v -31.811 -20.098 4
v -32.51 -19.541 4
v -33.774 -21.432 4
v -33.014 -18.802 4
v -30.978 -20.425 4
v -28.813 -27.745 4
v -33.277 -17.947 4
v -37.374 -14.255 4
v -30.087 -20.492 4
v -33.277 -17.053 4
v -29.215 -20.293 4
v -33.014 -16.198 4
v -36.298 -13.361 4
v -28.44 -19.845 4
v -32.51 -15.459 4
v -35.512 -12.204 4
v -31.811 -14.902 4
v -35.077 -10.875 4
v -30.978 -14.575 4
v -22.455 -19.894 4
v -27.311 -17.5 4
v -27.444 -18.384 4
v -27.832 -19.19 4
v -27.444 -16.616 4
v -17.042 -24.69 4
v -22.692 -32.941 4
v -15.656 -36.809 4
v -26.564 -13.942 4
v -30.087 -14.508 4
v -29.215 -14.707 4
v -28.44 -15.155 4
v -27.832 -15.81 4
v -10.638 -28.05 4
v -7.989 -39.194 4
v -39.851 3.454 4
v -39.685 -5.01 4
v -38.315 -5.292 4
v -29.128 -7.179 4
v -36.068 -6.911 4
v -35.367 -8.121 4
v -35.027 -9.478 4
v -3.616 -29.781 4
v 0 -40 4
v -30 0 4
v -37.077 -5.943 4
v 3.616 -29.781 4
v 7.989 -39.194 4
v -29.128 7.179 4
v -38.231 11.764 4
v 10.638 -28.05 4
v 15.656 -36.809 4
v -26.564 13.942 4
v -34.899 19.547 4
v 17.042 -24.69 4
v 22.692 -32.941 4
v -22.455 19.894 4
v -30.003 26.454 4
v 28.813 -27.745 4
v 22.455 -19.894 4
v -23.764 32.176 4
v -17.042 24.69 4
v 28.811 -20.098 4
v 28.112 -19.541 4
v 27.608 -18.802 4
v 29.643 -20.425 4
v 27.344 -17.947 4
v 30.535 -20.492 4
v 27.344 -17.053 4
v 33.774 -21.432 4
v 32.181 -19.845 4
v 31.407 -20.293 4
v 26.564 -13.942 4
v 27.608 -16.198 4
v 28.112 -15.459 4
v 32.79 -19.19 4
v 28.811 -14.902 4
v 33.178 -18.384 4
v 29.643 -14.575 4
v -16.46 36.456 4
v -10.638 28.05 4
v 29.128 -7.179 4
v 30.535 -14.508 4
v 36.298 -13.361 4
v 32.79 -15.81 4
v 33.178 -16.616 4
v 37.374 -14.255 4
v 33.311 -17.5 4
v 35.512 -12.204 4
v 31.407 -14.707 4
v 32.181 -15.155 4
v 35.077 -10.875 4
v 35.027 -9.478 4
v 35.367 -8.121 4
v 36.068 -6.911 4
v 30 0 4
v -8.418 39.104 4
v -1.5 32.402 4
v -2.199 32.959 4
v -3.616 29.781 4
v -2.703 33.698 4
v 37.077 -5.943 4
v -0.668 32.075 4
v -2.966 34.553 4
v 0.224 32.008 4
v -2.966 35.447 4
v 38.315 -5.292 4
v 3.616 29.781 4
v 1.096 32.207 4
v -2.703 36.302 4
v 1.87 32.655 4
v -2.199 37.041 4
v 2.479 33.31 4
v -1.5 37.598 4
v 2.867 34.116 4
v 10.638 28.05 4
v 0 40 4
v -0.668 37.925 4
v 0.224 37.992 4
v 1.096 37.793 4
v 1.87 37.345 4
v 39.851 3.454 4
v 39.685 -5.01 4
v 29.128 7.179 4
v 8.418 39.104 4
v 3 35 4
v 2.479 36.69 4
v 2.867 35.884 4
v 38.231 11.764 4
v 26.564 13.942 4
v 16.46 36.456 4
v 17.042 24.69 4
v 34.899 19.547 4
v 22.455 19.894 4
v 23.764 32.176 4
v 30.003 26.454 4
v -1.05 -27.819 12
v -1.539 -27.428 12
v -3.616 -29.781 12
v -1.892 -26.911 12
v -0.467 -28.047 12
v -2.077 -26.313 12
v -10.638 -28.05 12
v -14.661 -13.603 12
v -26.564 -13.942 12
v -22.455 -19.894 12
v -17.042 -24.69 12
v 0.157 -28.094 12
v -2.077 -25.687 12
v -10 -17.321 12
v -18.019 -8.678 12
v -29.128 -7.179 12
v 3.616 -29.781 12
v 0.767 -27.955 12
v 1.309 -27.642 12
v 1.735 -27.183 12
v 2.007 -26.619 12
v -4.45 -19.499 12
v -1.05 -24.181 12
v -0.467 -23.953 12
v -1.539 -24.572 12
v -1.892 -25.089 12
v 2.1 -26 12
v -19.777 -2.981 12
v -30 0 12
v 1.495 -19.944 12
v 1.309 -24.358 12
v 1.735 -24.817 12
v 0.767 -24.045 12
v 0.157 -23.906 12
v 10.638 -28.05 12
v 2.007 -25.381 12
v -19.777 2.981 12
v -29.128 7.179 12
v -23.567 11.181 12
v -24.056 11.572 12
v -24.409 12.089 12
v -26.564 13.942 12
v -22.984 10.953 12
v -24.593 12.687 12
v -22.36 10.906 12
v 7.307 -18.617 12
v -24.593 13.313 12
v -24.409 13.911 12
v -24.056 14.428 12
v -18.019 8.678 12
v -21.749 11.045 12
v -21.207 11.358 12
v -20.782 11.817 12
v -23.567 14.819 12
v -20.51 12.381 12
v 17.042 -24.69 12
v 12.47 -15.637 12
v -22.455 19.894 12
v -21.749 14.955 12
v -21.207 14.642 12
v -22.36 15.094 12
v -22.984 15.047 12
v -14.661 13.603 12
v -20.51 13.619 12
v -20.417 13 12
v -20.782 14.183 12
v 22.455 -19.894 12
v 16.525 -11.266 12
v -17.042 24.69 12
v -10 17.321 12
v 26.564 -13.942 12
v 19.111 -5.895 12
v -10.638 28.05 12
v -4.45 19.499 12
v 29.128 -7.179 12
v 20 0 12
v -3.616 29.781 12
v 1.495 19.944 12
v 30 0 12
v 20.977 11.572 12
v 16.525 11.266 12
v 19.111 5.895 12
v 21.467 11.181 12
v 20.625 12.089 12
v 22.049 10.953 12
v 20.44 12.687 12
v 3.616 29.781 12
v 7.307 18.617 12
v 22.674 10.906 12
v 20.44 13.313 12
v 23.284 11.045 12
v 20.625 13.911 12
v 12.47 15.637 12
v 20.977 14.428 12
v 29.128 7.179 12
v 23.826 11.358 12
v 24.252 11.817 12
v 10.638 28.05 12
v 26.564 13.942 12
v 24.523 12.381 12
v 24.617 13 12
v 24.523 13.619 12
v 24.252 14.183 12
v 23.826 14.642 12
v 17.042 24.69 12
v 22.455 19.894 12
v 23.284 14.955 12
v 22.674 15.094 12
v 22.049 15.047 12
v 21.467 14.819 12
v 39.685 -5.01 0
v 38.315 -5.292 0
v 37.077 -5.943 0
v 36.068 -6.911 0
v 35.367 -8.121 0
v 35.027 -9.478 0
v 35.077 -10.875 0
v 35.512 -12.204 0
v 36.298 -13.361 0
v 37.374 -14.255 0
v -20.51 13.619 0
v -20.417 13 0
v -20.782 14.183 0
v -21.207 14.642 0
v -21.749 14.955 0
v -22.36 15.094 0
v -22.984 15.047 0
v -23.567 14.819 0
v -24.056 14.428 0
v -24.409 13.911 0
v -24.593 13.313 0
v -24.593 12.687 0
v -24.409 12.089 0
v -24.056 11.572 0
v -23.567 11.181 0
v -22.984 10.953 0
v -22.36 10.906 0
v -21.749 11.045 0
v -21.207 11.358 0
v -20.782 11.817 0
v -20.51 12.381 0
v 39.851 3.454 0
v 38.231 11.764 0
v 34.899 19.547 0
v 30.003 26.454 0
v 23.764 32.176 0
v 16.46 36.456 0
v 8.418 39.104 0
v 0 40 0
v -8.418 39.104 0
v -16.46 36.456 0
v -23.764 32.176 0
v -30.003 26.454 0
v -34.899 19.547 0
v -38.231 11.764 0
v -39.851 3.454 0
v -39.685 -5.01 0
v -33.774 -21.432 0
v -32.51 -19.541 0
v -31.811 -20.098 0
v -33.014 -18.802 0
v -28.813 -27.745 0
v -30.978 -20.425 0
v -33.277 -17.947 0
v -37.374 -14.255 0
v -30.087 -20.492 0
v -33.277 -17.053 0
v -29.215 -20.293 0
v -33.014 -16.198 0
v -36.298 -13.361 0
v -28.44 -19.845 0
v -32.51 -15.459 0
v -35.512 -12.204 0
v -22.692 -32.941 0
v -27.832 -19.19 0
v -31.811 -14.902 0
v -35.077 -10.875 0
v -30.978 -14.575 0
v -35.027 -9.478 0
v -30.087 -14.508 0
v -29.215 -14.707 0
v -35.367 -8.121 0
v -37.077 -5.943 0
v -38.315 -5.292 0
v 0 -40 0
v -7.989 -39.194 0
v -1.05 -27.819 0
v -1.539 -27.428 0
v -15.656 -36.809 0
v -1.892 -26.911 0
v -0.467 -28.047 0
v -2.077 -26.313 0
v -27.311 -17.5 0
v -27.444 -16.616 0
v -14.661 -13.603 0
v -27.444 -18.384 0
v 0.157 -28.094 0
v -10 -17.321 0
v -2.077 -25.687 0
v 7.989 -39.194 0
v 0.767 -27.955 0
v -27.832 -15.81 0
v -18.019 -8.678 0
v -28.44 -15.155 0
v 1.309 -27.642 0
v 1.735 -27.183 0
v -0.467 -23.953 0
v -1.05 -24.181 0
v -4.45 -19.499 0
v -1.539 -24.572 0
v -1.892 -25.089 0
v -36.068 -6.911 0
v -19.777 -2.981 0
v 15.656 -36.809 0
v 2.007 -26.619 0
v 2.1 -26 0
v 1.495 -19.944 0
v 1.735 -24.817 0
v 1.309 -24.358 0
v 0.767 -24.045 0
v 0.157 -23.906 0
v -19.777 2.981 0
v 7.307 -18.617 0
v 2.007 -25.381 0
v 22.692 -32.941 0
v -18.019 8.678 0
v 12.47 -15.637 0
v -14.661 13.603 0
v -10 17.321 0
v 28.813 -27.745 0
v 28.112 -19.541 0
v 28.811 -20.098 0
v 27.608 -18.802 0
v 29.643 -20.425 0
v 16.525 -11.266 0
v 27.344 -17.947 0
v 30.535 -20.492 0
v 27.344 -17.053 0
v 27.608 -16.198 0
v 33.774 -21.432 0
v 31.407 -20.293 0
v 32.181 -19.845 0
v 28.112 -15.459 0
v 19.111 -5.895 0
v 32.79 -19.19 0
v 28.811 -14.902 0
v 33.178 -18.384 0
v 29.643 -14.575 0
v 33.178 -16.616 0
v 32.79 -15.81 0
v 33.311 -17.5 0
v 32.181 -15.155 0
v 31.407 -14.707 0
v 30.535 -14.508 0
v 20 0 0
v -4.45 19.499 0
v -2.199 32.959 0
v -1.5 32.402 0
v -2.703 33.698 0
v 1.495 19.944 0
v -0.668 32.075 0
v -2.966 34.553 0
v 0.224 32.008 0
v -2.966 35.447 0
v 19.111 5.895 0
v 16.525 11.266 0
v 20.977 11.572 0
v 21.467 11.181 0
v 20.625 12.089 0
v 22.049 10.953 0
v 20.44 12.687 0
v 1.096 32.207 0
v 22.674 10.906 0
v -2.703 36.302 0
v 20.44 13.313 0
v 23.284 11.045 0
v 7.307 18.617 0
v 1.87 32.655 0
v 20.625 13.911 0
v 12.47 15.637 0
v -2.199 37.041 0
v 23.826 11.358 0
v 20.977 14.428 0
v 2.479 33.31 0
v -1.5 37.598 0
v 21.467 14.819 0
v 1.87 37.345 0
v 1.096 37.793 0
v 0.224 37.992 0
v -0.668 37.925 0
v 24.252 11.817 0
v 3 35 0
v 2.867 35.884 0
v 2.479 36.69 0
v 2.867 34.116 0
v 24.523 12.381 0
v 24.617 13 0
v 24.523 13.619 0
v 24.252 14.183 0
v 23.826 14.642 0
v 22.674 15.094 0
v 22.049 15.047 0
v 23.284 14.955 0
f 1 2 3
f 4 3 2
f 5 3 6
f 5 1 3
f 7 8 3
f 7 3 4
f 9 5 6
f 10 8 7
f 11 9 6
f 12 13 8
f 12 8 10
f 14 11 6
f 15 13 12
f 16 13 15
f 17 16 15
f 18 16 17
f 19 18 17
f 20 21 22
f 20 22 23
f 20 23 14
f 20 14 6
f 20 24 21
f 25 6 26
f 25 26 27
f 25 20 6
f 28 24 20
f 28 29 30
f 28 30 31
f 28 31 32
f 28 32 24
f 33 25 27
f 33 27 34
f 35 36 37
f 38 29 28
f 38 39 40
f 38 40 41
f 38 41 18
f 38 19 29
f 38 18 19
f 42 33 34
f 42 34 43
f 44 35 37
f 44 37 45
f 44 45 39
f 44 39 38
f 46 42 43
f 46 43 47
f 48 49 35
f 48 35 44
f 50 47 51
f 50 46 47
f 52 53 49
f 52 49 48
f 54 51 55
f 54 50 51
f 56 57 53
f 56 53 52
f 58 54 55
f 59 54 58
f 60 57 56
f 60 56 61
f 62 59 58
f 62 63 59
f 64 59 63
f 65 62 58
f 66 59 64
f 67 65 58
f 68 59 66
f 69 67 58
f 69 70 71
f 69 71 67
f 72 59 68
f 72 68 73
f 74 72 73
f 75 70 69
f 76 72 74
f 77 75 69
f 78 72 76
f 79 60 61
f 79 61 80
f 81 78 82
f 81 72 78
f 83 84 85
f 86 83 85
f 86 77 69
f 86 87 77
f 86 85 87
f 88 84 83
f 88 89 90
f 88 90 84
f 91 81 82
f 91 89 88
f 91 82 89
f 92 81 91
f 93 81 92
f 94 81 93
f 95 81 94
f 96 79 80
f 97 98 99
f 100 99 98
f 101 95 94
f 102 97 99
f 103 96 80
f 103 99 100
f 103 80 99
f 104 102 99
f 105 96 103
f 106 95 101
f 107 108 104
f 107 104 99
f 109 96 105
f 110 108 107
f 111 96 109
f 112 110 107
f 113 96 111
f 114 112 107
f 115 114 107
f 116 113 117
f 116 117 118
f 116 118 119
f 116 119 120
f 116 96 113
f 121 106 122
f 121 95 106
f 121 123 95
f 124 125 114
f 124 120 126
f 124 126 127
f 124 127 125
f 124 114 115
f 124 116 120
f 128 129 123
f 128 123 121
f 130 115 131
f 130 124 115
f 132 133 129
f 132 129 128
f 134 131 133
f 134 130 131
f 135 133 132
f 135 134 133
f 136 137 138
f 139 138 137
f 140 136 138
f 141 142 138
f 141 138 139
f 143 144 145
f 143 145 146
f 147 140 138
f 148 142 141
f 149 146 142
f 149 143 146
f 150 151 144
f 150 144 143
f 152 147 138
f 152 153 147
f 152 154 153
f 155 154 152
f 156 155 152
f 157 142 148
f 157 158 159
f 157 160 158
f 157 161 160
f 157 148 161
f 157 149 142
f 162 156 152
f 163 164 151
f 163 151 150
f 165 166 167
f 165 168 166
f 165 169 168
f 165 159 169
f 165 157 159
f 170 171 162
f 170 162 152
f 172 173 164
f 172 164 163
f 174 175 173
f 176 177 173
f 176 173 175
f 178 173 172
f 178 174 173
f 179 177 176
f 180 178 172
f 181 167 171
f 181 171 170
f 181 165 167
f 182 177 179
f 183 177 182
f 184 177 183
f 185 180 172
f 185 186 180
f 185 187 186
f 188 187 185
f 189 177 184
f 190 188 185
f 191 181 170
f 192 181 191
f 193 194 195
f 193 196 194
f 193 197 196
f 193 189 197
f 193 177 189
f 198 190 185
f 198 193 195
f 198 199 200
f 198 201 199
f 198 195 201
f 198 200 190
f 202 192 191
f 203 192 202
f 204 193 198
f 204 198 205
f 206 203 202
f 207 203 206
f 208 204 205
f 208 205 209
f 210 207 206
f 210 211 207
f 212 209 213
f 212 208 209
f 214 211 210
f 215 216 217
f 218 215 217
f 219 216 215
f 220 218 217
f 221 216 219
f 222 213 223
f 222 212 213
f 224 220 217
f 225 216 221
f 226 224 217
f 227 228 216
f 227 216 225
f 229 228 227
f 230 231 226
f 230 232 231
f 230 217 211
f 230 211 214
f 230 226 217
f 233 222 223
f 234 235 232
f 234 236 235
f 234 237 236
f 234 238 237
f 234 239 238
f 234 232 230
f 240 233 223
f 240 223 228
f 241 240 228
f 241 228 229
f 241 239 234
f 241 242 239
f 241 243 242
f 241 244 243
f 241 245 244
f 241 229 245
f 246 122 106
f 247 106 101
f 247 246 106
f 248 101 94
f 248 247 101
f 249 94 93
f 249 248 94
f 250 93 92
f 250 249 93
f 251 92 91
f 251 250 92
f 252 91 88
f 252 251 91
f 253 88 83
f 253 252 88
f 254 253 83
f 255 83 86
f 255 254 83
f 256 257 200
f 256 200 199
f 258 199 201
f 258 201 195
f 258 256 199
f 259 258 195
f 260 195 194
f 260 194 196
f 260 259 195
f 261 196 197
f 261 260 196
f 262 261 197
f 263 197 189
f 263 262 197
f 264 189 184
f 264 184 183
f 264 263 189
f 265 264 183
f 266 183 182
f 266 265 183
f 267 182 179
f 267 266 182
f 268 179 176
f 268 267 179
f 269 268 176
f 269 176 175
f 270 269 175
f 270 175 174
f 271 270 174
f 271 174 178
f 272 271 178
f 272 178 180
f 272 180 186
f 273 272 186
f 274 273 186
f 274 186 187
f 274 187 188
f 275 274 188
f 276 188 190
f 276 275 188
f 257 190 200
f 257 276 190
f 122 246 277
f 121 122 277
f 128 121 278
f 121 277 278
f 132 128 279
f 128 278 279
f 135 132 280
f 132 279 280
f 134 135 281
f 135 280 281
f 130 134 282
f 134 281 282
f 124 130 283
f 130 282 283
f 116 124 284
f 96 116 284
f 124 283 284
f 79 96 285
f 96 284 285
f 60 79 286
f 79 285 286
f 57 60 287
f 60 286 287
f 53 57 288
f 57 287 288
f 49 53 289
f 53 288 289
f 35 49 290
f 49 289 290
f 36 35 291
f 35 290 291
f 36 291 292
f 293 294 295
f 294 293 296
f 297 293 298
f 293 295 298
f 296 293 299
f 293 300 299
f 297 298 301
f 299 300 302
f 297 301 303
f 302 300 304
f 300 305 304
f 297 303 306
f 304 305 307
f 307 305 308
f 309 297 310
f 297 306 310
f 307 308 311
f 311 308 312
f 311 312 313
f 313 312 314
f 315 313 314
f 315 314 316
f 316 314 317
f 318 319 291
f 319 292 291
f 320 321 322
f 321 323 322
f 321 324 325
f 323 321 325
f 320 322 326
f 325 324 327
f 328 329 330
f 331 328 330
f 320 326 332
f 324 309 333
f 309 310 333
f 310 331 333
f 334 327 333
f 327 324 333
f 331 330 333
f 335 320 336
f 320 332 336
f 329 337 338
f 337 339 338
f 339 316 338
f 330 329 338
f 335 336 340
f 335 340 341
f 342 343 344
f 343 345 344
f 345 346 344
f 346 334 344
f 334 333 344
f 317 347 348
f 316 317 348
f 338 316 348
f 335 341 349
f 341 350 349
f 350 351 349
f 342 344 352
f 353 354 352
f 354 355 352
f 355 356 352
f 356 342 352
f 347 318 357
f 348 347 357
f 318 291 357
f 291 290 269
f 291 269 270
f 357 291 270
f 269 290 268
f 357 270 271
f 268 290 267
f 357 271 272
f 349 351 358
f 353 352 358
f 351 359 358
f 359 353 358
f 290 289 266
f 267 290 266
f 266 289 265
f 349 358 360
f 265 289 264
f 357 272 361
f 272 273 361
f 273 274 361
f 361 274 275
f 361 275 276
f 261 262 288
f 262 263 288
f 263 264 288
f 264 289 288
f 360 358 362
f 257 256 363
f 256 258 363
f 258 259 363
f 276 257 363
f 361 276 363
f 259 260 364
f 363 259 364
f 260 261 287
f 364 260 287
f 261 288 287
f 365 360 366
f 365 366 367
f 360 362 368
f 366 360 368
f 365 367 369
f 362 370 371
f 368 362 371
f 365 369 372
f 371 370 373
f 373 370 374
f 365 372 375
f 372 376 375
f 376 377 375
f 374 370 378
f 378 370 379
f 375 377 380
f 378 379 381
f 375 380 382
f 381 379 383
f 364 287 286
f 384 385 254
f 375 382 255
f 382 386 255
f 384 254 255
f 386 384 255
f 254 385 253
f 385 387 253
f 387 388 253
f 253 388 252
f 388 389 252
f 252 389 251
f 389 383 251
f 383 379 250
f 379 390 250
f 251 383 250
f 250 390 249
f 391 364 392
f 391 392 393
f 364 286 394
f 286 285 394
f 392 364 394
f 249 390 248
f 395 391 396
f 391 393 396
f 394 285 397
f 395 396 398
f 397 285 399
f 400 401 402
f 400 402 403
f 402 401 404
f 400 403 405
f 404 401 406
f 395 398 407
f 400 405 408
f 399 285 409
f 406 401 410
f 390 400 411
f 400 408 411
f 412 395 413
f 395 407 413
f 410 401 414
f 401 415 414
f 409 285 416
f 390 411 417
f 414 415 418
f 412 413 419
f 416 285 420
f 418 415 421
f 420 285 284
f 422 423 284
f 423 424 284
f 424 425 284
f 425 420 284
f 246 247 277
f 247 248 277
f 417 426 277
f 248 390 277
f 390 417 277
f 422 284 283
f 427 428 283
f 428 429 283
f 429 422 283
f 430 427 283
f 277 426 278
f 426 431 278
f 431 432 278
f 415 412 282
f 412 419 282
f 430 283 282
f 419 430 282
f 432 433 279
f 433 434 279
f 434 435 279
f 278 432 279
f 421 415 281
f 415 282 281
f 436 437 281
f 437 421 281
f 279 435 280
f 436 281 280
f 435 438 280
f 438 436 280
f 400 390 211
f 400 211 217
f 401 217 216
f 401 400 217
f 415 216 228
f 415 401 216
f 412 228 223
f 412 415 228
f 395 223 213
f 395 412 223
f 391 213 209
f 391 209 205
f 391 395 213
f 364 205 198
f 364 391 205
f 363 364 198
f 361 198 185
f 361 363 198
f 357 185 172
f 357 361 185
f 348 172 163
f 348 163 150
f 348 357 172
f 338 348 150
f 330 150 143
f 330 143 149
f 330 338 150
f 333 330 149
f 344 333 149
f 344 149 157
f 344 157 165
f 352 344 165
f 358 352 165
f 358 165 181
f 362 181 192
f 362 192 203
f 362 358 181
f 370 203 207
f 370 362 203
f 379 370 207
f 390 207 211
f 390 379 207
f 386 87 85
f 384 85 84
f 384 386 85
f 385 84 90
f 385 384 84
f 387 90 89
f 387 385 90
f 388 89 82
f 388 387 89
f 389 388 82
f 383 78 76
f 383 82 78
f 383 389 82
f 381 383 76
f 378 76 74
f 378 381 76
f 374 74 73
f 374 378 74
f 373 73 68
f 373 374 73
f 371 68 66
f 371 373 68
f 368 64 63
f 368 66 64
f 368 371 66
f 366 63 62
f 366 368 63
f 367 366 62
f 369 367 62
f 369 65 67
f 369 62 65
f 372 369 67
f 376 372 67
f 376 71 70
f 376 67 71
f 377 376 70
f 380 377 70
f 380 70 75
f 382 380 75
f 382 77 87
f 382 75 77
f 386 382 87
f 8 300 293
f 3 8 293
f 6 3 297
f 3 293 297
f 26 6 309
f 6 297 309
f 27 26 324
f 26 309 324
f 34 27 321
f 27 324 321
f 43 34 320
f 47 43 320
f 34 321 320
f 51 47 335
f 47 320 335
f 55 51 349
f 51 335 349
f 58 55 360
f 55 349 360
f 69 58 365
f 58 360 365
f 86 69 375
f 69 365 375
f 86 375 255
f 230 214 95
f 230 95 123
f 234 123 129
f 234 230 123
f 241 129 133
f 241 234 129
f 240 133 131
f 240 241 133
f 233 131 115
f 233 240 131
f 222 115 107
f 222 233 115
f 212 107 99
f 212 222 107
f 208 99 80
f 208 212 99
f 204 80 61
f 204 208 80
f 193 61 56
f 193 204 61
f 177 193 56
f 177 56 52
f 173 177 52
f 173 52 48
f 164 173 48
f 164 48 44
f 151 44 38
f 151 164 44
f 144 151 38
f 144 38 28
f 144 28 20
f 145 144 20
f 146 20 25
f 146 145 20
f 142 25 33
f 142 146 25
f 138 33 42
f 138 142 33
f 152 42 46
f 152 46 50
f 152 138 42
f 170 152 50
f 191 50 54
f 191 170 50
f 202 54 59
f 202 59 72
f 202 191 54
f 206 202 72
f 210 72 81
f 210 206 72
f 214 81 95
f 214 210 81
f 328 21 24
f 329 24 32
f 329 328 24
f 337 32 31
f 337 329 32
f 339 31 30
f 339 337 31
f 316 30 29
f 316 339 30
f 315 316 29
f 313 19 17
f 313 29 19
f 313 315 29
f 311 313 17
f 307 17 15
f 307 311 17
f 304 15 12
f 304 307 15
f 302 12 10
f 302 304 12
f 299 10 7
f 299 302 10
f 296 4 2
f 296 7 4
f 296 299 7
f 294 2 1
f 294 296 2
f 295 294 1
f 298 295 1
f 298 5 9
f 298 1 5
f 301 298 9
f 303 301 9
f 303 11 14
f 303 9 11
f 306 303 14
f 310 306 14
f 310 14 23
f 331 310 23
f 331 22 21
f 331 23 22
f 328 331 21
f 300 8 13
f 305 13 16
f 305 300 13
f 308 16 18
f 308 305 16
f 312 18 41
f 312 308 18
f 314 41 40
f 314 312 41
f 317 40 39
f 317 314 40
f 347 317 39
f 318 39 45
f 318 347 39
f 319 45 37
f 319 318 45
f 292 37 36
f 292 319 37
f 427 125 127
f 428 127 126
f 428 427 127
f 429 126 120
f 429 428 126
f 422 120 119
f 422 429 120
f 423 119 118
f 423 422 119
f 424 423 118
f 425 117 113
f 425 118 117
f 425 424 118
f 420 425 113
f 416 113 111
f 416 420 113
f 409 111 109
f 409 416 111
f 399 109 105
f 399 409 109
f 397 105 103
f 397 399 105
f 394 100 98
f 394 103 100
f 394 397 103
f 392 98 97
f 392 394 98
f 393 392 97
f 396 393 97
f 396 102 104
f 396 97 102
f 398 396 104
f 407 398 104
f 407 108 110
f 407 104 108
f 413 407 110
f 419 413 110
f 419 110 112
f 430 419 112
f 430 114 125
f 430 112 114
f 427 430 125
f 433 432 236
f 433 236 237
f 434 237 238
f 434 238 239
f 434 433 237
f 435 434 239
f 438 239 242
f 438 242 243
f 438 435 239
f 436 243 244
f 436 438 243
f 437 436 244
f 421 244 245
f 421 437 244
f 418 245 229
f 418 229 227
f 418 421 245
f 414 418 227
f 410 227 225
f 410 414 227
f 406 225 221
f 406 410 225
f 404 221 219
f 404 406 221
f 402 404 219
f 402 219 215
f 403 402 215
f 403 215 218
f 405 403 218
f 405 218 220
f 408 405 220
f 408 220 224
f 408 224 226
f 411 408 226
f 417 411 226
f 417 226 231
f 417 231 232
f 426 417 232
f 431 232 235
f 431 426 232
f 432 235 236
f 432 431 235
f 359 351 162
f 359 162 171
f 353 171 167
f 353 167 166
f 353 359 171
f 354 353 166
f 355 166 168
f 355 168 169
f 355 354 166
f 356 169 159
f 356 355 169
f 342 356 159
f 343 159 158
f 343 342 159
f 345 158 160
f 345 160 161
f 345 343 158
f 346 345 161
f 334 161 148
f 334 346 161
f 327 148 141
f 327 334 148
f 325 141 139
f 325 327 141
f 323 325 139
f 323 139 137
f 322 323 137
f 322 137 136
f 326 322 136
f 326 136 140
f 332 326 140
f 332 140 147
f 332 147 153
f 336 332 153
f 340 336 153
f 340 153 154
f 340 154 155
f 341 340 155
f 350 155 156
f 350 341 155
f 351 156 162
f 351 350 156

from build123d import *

# Parameters (mm, degrees)
SKETCH_R      = 3
SKETCH_R_2    = 2.1
SKETCH_R_3    = 20
PAD_DEPTH     = 12
SKETCH001_R   = 40
SKETCH001_R_2 = 30
POCKET_DEPTH  = 8


with BuildPart() as part:
    # Sketch → Pad (new body)
    with BuildSketch(Plane.XY):
        with BuildLine():
            ThreePointArc((-37.373806, -14.254775), (0, -40), (37.373806, -14.254775))
            ThreePointArc((39.685017, -5.009931), (35.149287, -8.787322), (37.373806, -14.254775))
            ThreePointArc((39.685017, -5.009931), (0, 40), (-39.685017, -5.009931))
            ThreePointArc((-37.373806, -14.254775), (-35.149287, -8.787322), (-39.685017, -5.009931))
        make_face()
        with Locations((0, 35)):
            Circle(SKETCH_R, mode=Mode.SUBTRACT)
        with Locations((-30.310889, -17.5)):
            Circle(SKETCH_R, mode=Mode.SUBTRACT)
        with Locations((30.310889, -17.5)):
            Circle(SKETCH_R, mode=Mode.SUBTRACT)
        with Locations((-22.51666, 13)):
            Circle(SKETCH_R_2, mode=Mode.SUBTRACT)
        with Locations((22.51666, 13)):
            Circle(SKETCH_R_2, mode=Mode.SUBTRACT)
        with Locations((0, -26)):
            Circle(SKETCH_R_2, mode=Mode.SUBTRACT)
        Circle(SKETCH_R_3, mode=Mode.SUBTRACT)
    extrude(amount=PAD_DEPTH)

    # Sketch001 (on Face13 of Pad) → Pocket (cut)
    with BuildSketch(Plane.XY.offset(12)):
        Circle(SKETCH001_R)
        Circle(SKETCH001_R_2, mode=Mode.SUBTRACT)
    extrude(amount=-POCKET_DEPTH, mode=Mode.SUBTRACT)


solid = part.part
